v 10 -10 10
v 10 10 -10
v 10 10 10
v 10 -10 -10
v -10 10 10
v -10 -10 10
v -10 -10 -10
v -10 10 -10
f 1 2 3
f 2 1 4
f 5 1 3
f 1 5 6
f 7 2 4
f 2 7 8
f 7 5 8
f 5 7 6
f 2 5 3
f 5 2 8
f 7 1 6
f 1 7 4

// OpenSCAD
// -------------------------------------+---------------------------------------+---------------------------------------+---------------------------------------
// Title:        Parametric Test Block
// Version:      1.0
// Release Date: 2017-04-02 (ISO)
// Author:       Rohin Gosling
// -------------------------------------+---------------------------------------+---------------------------------------+---------------------------------------
//
// Description:
//
// - Simple 3D object generator, to generate test and calibration parts for 3D printers.
//
// Release Notes:
//
// - Version 1.0
//   * Model created.
//
// -------------------------------------+---------------------------------------+---------------------------------------+---------------------------------------

// -------------------------------------+---------------------------------------+---------------------------------------+---------------------------------------
// Constants:
// -------------------------------------+---------------------------------------+---------------------------------------+---------------------------------------

// System constants.

C_CONSTANT = 0 + 0;     // Used to hide constant values from Thingiverse. Add to other constants to hide them as well.

// General constants.

C_NONE = C_CONSTANT + 0;

// SCG constants.

SCG_OVERLAP = C_CONSTANT + 0.01;    // Used for overlapping Boolean operations in order to avoid Boolean edge artefacts.

// Shape

C_SHAPE_NONE      = C_CONSTANT + 0;
C_SHAPE_CUBOID    = C_CONSTANT + 1;
C_SHAPE_CYLINDER  = C_CONSTANT + 2;
C_SHAPE_PYRAMID   = C_CONSTANT + 3;
C_SHAPE_PRISM     = C_CONSTANT + 4;
C_SHAPE_ELLIPSOID = C_CONSTANT + 5;
C_SHAPE_TORUS     = C_CONSTANT + 6;

// Minimum and maximum constraints.

C_RESOLUTION_MIN  = C_CONSTANT + 8;
C_RESOLUTION_MAX  = C_CONSTANT + 64;
C_SIZE_MIN        = C_CONSTANT + 1.0;
C_SIDE_COUNT_MIN  = C_CONSTANT + 3;
C_SIDE_COUNT_MAX  = C_CONSTANT + 12;


// -------------------------------------+---------------------------------------+---------------------------------------+---------------------------------------
// Thingiverse Parameters.
//
// - These parameters are used to integrate with the Thingiverse Customizer, and should only be used by the
//   class member variables specified in the "Model parameters" section below.
//
// - These Thingiverse Parameters should never be accessed from inside any module. We do this to enforce 
//   principles of object orientation.
//
// - By separating concerns between variables exposed to Thingiverse vs. variables used internally by the 
//   SCAD model (class), we are better able to manage the ordering and grouping of variables exposed to 
//   Thingiverse, vs. the ordering and constraints of variables used internally by the model.
//
// -------------------------------------+---------------------------------------+---------------------------------------+---------------------------------------

/* [Assembbly Parameters] */

object_shape    = 1;        // [ 1:Cuboid, 2:Cylinder, 3:Pyramid, 4:Prism, 5:Ellipsoid, 6:Torus ]
x_bore_shape    = 0;        // [ 0: None, 2:Cylinder, 4:Prism ]
y_bore_shape    = 0;        // [ 0: None, 2:Cylinder, 4:Prism ]
z_bore_shape    = 0;        // [ 0: None, 2:Cylinder, 4:Prism ]
resolution      = 128;

/* [Cuboid Parameters] */

cuboid_x      = 20.0;
cuboid_y      = 20.0;
cuboid_z      = 20.0;
cuboid_fillet = 0.0;

/* [Cylinder Parameters] */

cylinder_diameter_base = 20.0;
cylinder_diameter_top  = 20.0;
cylinder_height        = 20.0;

/* [Pyramid Parameters] */

pyramid_side_count  = 4;
pyramid_side_length = 20.0;
pyramid_height      = 20.0;

/* [Prism Parameters] */

prism_side_count  = 3;
prism_side_length = 20.0;
prism_height      = 20.0;

/* [Ellipsoid Parameters] */

ellipsoid_diameter_x = 20.0;
ellipsoid_diameter_y = 20.0;
ellipsoid_diameter_z = 20.0;

/* [Torus Parameters] */

torus_major_radius = 12.0;
torus_minor_radius = 6.0;

/* [Bore Parameters] */

x_bore_diameter         = 10;
y_bore_diameter         = 10;
z_bore_diameter         = 10;
x_bore_prism_side_count = 4;
y_bore_prism_side_count = 4;
z_bore_prism_side_count = 4;

// -------------------------------------+---------------------------------------+---------------------------------------+---------------------------------------
// Model parameters and geometric constraints. (Class member variables).
//
// - If we treat an OpenSCAD file as though it is an object oriented class, then we can prefix global variables
//   with "m_", to denote class membership. 
//   - As an alternative to "m_", we could also use "this_" as a standard. However, "m_" is shorter and faster to type.
//   - Another advantage of this convention, is that we can arrange parameters meant for display in Thingiverse, in 
//     an order that makes sense to the user, while arranging the member versions of the parameters in an order
//     that better accommodates constraint computation.
//
// - Once we have defined global variables as member variables of a class, in this case the class represented
//   by the SCAD file, then we are free to better manage global vs local scope of class member 
//   variables, vs. local module (method) variables.
//
// - Thingiverse only integrates constant literal values. So as long as we reference other parameters or 
//   initialize variables as expressions, then none of these will appear in the Thingiverse customizer.
//
// -------------------------------------+---------------------------------------+---------------------------------------+---------------------------------------

// Assembly Parameters

m_object_shape    = object_shape;
m_x_bore_shape    = x_bore_shape;
m_y_bore_shape    = y_bore_shape;
m_z_bore_shape    = z_bore_shape;
m_resolution      = clip ( resolution, C_RESOLUTION_MIN, C_RESOLUTION_MAX );

// Cuboid Parameters.

m_cuboid_x             = ( cuboid_x < C_SIZE_MIN ) ? C_SIZE_MIN : cuboid_x;
m_cuboid_y             = ( cuboid_y < C_SIZE_MIN ) ? C_SIZE_MIN : cuboid_y;
m_cuboid_z             = ( cuboid_z < C_SIZE_MIN ) ? C_SIZE_MIN : cuboid_z;
m_cuboid_min_dimention = ( m_cuboid_x < m_cuboid_y && m_cuboid_x < m_cuboid_z ) ? m_cuboid_x : ( m_cuboid_y < m_cuboid_x && m_cuboid_y < m_cuboid_z ) ? m_cuboid_y : m_cuboid_z;
m_cuboid_fillet        = clip ( cuboid_fillet, 0.0, m_cuboid_min_dimention/2.0 );

// Cylinder Parameters.

m_cylinder_diameter_base = ( cylinder_diameter_base < 0.0 ) ? 0.0 : cylinder_diameter_base;
m_cylinder_diameter_top  = ( cylinder_diameter_top  < 0.0 ) ? 0.0 : cylinder_diameter_top;
m_cylinder_height        = ( cylinder_height < C_SIZE_MIN ) ? C_SIZE_MIN : cylinder_height;

// Pyramid Parameters.

m_pyramid_side_count  = clip ( pyramid_side_count, C_SIDE_COUNT_MIN, C_SIDE_COUNT_MAX );
m_pyramid_side_length = ( pyramid_side_length < C_SIZE_MIN ) ? C_SIZE_MIN : pyramid_side_length;
m_pyramid_height      = ( pyramid_height < C_SIZE_MIN ) ? C_SIZE_MIN : pyramid_height;

// Prism Parameters.

m_prism_side_count  = clip ( prism_side_count, C_SIDE_COUNT_MIN, C_SIDE_COUNT_MAX );
m_prism_side_length = ( prism_side_length < C_SIZE_MIN ) ? C_SIZE_MIN : prism_side_length;
m_prism_height      = ( prism_height < C_SIZE_MIN ) ? C_SIZE_MIN : prism_height;

// Ellipsoid Parameters.

m_ellipsoid_diameter_x = ( ellipsoid_diameter_x < C_SIZE_MIN ) ? C_SIZE_MIN : ellipsoid_diameter_x;
m_ellipsoid_diameter_y = ( ellipsoid_diameter_y < C_SIZE_MIN ) ? C_SIZE_MIN : ellipsoid_diameter_y;
m_ellipsoid_diameter_z = ( ellipsoid_diameter_z < C_SIZE_MIN ) ? C_SIZE_MIN : ellipsoid_diameter_z;

// Torus Parameters.

m_torus_major_radius = ( torus_major_radius < C_SIZE_MIN ) ? C_SIZE_MIN : torus_major_radius;
m_torus_minor_radius = ( torus_minor_radius < C_SIZE_MIN ) ? C_SIZE_MIN : torus_minor_radius;

// Bore.

m_x_bore_diameter         = ( x_bore_diameter < C_SIZE_MIN ) ? C_SIZE_MIN : x_bore_diameter;
m_y_bore_diameter         = ( y_bore_diameter < C_SIZE_MIN ) ? C_SIZE_MIN : y_bore_diameter;
m_z_bore_diameter         = ( z_bore_diameter < C_SIZE_MIN ) ? C_SIZE_MIN : z_bore_diameter;
m_x_bore_prism_side_count = clip ( x_bore_prism_side_count, C_SIDE_COUNT_MIN, C_SIDE_COUNT_MAX );
m_y_bore_prism_side_count = clip ( y_bore_prism_side_count, C_SIDE_COUNT_MIN, C_SIDE_COUNT_MAX );
m_z_bore_prism_side_count = clip ( z_bore_prism_side_count, C_SIDE_COUNT_MIN, C_SIDE_COUNT_MAX );

// -------------------------------------+---------------------------------------+---------------------------------------+---------------------------------------
// DEBUG: Console Output. 
// -------------------------------------+---------------------------------------+---------------------------------------+---------------------------------------

C_DEBUG_ENABLED = false;

if ( C_DEBUG_ENABLED )
{
    //echo ( m_x = m_x ); 
}

// -------------------------------------+---------------------------------------+---------------------------------------+---------------------------------------
// Module:      Main
// Module Type: Model
//
// Description:
//
// - Program entry point.
//
// -------------------------------------+---------------------------------------+---------------------------------------+---------------------------------------

main();

module main ()
{   
    // Initialize model resolution.
    
    $fn = m_resolution;
    
    // Generate hinge assembly.
        
    assembly ();    
}

// -------------------------------------+---------------------------------------+---------------------------------------+---------------------------------------
// Module:      assembly_main
// Module Type: Assembly
//
// Description:
//
// - Main component assembly.
//
// Parameters:
//
// - N/A
//
// -------------------------------------+---------------------------------------+---------------------------------------+---------------------------------------

module assembly ()
{
    if      ( m_object_shape == C_SHAPE_NONE )      object_none ();
    else if ( m_object_shape == C_SHAPE_CUBOID )    object_cuboid ();
    else if ( m_object_shape == C_SHAPE_CYLINDER )  object_cylinder ();
    else if ( m_object_shape == C_SHAPE_PYRAMID )   object_pyramid ();
    else if ( m_object_shape == C_SHAPE_PRISM )     object_prism ();
    else if ( m_object_shape == C_SHAPE_ELLIPSOID ) object_ellipsoid ();
    else if ( m_object_shape == C_SHAPE_TORUS )     object_torus ();    
    else if ( m_object_shape == C_SHAPE_NONE )      object_none ();    
}

// -------------------------------------+---------------------------------------+---------------------------------------+---------------------------------------
// Module:      object_none
// Module Type: Object
//
// Description:
//
// - Placeholder module for dealing with zero object selection.
//
// Parameters:
//
// - N/A
//
// -------------------------------------+---------------------------------------+---------------------------------------+---------------------------------------

module object_none ()
{
}

// -------------------------------------+---------------------------------------+---------------------------------------+---------------------------------------
// Module:      object_cuboid
// Module Type: Object
//
// Description:
//
// - Cuboid object defined by width, length, height and fillet size.
//
// Parameters:
//
// - N/A
//
// -------------------------------------+---------------------------------------+---------------------------------------+---------------------------------------

module object_cuboid ()
{
    // Initialize parameters.
    
    sf = m_cuboid_fillet;
    sx = m_cuboid_x;
    sy = m_cuboid_y;
    sz = m_cuboid_z;
    
    // Generate object.

    difference ()
    {
        // Generate base object.
        
        if ( sf > 0 )
        {
            object_cuboid_filleted ();
        }
        else
        {
            cube ( size = [ sx, sy, sz ], center = true );
        }
        
        // Subtract bores.
        
        cutting_tool_bore ( sx, sy, sz );
    }
}

// -------------------------------------+---------------------------------------+---------------------------------------+---------------------------------------
// Module:      object_cuboid_filleted
// Module Type: Object
//
// Description:
//
// - Used by the Cuboid object, to implement fillets.
//
// Parameters:
//
// - N/A
//
// -------------------------------------+---------------------------------------+---------------------------------------+---------------------------------------

module object_cuboid_filleted ()
{
    // Local constants.
    
    EDGE_CENTER = 0;    
    EDGE_ANGLE  = 1;
    EDGE_LENGTH = 2;
    
    // Initialize parameters.
    
    sf = m_cuboid_fillet;
    sx = m_cuboid_x;
    sy = m_cuboid_y;
    sz = m_cuboid_z;
    
    // Generate object.

    difference ()
    {
        // Generate base object.
        
        union ()
        {
            // Create cube work pieces.
            
            c = 2.0*sf;
            cube ( size = [ sx,     sy - c, sz - c ], center = true );
            cube ( size = [ sx - c, sy - c, sz     ], center = true );
            cube ( size = [ sx - c, sy,     sz - c ], center = true );
            
            // Create fillets.
            
            rx = sx/2.0 - sf;
            ry = sy/2.0 - sf;
            rz = sz/2.0 - sf;
            
            ex = m_cuboid_x - 2.0*sf;
            ey = m_cuboid_y - 2.0*sf;;
            ez = m_cuboid_z - 2.0*sf;;
            
            // Create vertex fillets.
            
            n_vertex = 8;
            v_vertex =
            [
                [ rx, ry,  rz ],[ -rx, ry,  rz ], [ -rx, -ry,  rz ], [ rx, -ry,  rz ],
                [ rx, ry, -rz ],[ -rx, ry, -rz ], [ -rx, -ry, -rz ], [ rx, -ry, -rz ]
            ];
                              
            for ( i = [ 0 : n_vertex - 1 ] )
            {
                translate ( v_vertex [ i ] ) sphere ( r = sf, center = true );
            }
            
            // Create edge fillets.
            
            n_edge = 12;
            v_edge =
            [
                [ [  rx,  ry, 0.0 ], [  0.0,  0.0, 0.0 ], ez ], [ [ -rx,  ry, 0.0 ], [  0.0,  0.0, 0.0 ], ez ],
                [ [  rx, -ry, 0.0 ], [  0.0,  0.0, 0.0 ], ez ], [ [ -rx, -ry, 0.0 ], [  0.0,  0.0, 0.0 ], ez ],
                [ [  rx, 0.0,  rz ], [ 90.0,  0.0, 0.0 ], ey ], [ [  rx, 0.0, -rz ], [ 90.0,  0.0, 0.0 ], ey ],
                [ [ -rx, 0.0,  rz ], [ 90.0,  0.0, 0.0 ], ey ], [ [ -rx, 0.0, -rz ], [ 90.0,  0.0, 0.0 ], ey ],
                [ [ 0.0,  ry,  rz ], [  0.0, 90.0, 0.0 ], ex ], [ [ 0.0,  ry, -rz ], [  0.0, 90.0, 0.0 ], ex ],
                [ [ 0.0, -ry,  rz ], [  0.0, 90.0, 0.0 ], ex ], [ [ 0.0, -ry, -rz ], [  0.0, 90.0, 0.0 ], ex ]
            ];
            
            for ( i = [ 0 : n_edge - 1 ] )
            {
                v = v_edge [ i ][ EDGE_CENTER ];
                a = v_edge [ i ][ EDGE_ANGLE  ];
                s = v_edge [ i ][ EDGE_LENGTH ];
                
                echo ( a = a );
                
                translate ( v ) rotate ( a ) cylinder ( r = sf, h = s, center = true );
            }
            
        }
        
        // Subtract bores.
        
        cutting_tool_bore ( sx, sy, sz );
    }
}

// -------------------------------------+---------------------------------------+---------------------------------------+---------------------------------------
// Module:      object_cylinder
// Module Type: Object
//
// Description:
//
// - Cylinder object defined by base diameter, top diameter and height.
//
// Parameters:
//
// - N/A
//
// -------------------------------------+---------------------------------------+---------------------------------------+---------------------------------------

module object_cylinder ()
{
    // Initialize parameters.
    
    d1 = m_cylinder_diameter_base;
    d2 = m_cylinder_diameter_top;
    h  = m_cylinder_height;
    
    // Generate object.
    
    difference ()
    {
        // Generate base object.
        
        cylinder ( d1 = d1, d2 = d2, h = h, center = true );
        
        // Subtract bores.
        
        d_max = ( d1 > d2 ) ? d1 : d2;
        cutting_tool_bore ( sx = d_max, sy = d_max, sz = h );
    }
}

// -------------------------------------+---------------------------------------+---------------------------------------+---------------------------------------
// Module:      object_pyramid
// Module Type: Object
//
// Description:
//
// - Pyramid object defined by height, side length, and side count.
//
// Parameters:
//
// - N/A
//
// -------------------------------------+---------------------------------------+---------------------------------------+---------------------------------------

module object_pyramid ()
{
    // Initialize parameters.
    
    n = m_pyramid_side_count;    
    s = m_pyramid_side_length;
    h = m_pyramid_height;
    t = 180/n;
    
    // Compute base diameter based on side length.
        
    d1 = s/sin(180/n);
    d2 = 0;
    
    // Generate object.
    
    difference ()
    {
        // Generate base object.
        
        rotate ( [ 0, 0, t ] ) cylinder ( d1 = d1, d2 = d2, h = h, $fn = n, center = true );
        
        // Subtract bores.
        
        d_max = ( d1 > d2 ) ? d1 : d2;
        translate ( [ 0, 0, -h/5 ] ) cutting_tool_bore ( sx = d_max, sy = d_max, sz = 2*h );
    }
}

// -------------------------------------+---------------------------------------+---------------------------------------+---------------------------------------
// Module:      object_prism
// Module Type: Object
//
// Description:
//
// - Prism object defined by height, side length, and side count.
//
// Parameters:
//
// - N/A
//
// -------------------------------------+---------------------------------------+---------------------------------------+---------------------------------------

module object_prism ()
{
    // Initialize parameters.
    
    n = m_prism_side_count;    
    s = m_prism_side_length;
    h = m_prism_height;
    t = 180/n;
    
    // Compute base diameter based on side length.
        
    d1 = s/sin(180/n);
    d2 = d1;
    
    // Generate object.
    
    difference ()
    {
        // Generate base object.
        
        rotate ( [ 0, 0, t ] ) cylinder ( d1 = d1, d2 = d2, h = h, $fn = n, center = true );
        
        // Subtract bores.
                
        cutting_tool_bore ( sx = d1, sy = d1, sz = h );
    }
}

// -------------------------------------+---------------------------------------+---------------------------------------+---------------------------------------
// Module:      object_ellipsoid
// Module Type: Object
//
// Description:
//
// - Ellipsoid object defined by width, length and height.
//
// Parameters:
//
// - N/A
//
// -------------------------------------+---------------------------------------+---------------------------------------+---------------------------------------

module object_ellipsoid ()
{
    // Compute ellipsoid scaling.
     
    d  = 1.0;     
    sx = m_ellipsoid_diameter_x;
    sy = m_ellipsoid_diameter_y;
    sz = m_ellipsoid_diameter_z;
    
    // Generate object.
    
    difference ()
    {
        // Generate base object.
        
        scale ( [ sx, sy, sz ] ) sphere ( d = d );
        
        // Subtract bores.
                
        cutting_tool_bore ( sx = sx, sy = sy, sz = sz );
    } 
}

// -------------------------------------+---------------------------------------+---------------------------------------+---------------------------------------
// Module:      object_torus
// Module Type: Object
//
// Description:
//
// - Torus object defined by major and minor radii.
//
// Parameters:
//
// - N/A
//
// -------------------------------------+---------------------------------------+---------------------------------------+---------------------------------------

module object_torus ()
{
    // Initialize parameters.
    
    R = m_torus_major_radius;
    r = m_torus_minor_radius;    
    
    // Generate object.
    
    difference ()
    {
        // Generate base object.
        
        rotate_extrude ()
        {
            translate ( [ R, 0, 0 ] ) circle ( r = r);
        }
        
        // Subtract bores.
        
        s  = 2*( r + R );
        sx = s;
        sy = s;
        sz = 2*r;
        
        cutting_tool_bore ( sx = sx, sy = sy, sz = sz );
    } 
}

// -------------------------------------+---------------------------------------+---------------------------------------+---------------------------------------
// Module:      cutting_tool_bore
// Module Type: Cutting tool
//
// Description:
//
// - Cutting tool used to cut the bore holes into the base object.
//
// Parameters:
//
// - N/A
//
// -------------------------------------+---------------------------------------+---------------------------------------+---------------------------------------

module cutting_tool_bore ( sx, sy, sz )
{
    nx = m_x_bore_prism_side_count;
    ny = m_y_bore_prism_side_count;
    nz = m_z_bore_prism_side_count;
    
    txo = ( nx == 6 ) ? 90.0 :   0.0;
    tyo = ( ny == 6 ) ? 0.0  : -90.0;
    
    tx = 180/nx + txo;
    ty = 180/ny + tyo;
    tz = 180/nz;
            
    // Subtract cylindrical bores.
        
    if ( m_x_bore_shape == C_SHAPE_CYLINDER ) rotate ( [ 0, 90, 0 ] ) cylinder ( d = m_x_bore_diameter, h = sx + SCG_OVERLAP, center = true );
    if ( m_y_bore_shape == C_SHAPE_CYLINDER ) rotate ( [ 90, 0, 0 ] ) cylinder ( d = m_y_bore_diameter, h = sy + SCG_OVERLAP, center = true );
    if ( m_z_bore_shape == C_SHAPE_CYLINDER ) rotate ( [ 0,  0, 0 ] ) cylinder ( d = m_z_bore_diameter, h = sz + SCG_OVERLAP, center = true );
            
    // Subtract prisim bores.
    
    if ( m_x_bore_shape == C_SHAPE_PRISM ) rotate ( [ 0, 90, 0 ] ) rotate ( [ 0, 0, tx ] ) cylinder ( d = m_x_bore_diameter, h = sx + SCG_OVERLAP, $fn = nx, center = true );
    if ( m_y_bore_shape == C_SHAPE_PRISM ) rotate ( [ 90, 0, 0 ] ) rotate ( [ 0, 0, ty ] ) cylinder ( d = m_y_bore_diameter, h = sy + SCG_OVERLAP, $fn = ny, center = true );
    if ( m_z_bore_shape == C_SHAPE_PRISM ) rotate ( [ 0,  0, 0 ] ) rotate ( [ 0, 0, tz ] ) cylinder ( d = m_z_bore_diameter, h = sz + SCG_OVERLAP, $fn = nz, center = true );
}


// -------------------------------------+---------------------------------------+---------------------------------------+---------------------------------------
// Module:      Rectangle.
// Module Type: 2D Shape.
//
// Description:
//
// - Creates a 2D rectangle.
//
// Parameters:
//
// - w
//   Rectangle width.
//
// - h
//   Rectangle height.
//
// - center
//   Center the rectangle about the origin (0,0,0) if true, else place the rectangle in the positive quadrant.
//
// -------------------------------------+---------------------------------------+---------------------------------------+---------------------------------------

module fillet_rectangle ( w, h, r, center )
{
    xs = w - 2*r;
    ys = h - 2*r;
    xd = w/2.0 - r;  
    yd = h/2.0 - r;    
    
    union ()
    {
        scale ( [ xs, h  ] ) square ( size = 1.0, center = center );
        scale ( [ w,  ys ] ) square ( size = 1.0, center = center );
        translate ( [  xd,  yd ] ) circle ( r = r, center = center );
        translate ( [  xd, -yd ] ) circle ( r = r, center = center );
        translate ( [ -xd, -yd ] ) circle ( r = r, center = center );
        translate ( [ -xd,  yd ] ) circle ( r = r, center = center );
    }
}

// -------------------------------------+---------------------------------------+---------------------------------------+---------------------------------------
// Module:      Rectangle.
// Module Type: 2D Shape.
//
// Description:
//
// - Creates a 2D rectangle.
//
// Parameters:
//
// - w
//   Rectangle width.
//
// - h
//   Rectangle height.
//
// - center
//   Center the rectangle about the origin (0,0,0) if true, else place the rectangle in the positive quadrant.
//
// -------------------------------------+---------------------------------------+---------------------------------------+---------------------------------------

module rectangle ( w, h, center )
{
    scale ( [ w, h ] ) square ( size = 1.0, center = center );
}

// -------------------------------------+---------------------------------------+---------------------------------------+---------------------------------------
// Function: Clip
//
// Description:
//
// - Clips an input value, to a minimum and maximum value.
//
//   x_min ≤ x ≤ x_max
// 
// Parameters:
//
// - x
//   Input value.
//
// - x_min
//   Minimal value constraint. Any x less than x_min, is set to x_min. 
//
// - x_max
//   Maximum value constraint. Any x greater than x_max, is set to x_max.
//
// -------------------------------------+---------------------------------------+---------------------------------------+---------------------------------------

function clip ( x, x_min, x_max ) = ( x < x_min ) ? x_min : ( x > x_max ) ? x_max : x;


// -------------------------------------+---------------------------------------+---------------------------------------+---------------------------------------
// Function: funtion_name
//
// Description:
//
// - Function description.
//
// Return Value:
//
// - Description of return value.
//
// Parameters:
//
// - x
//   Argument x description.
//
// - y
//   Argument y description.
//
// -------------------------------------+---------------------------------------+---------------------------------------+---------------------------------------

// -------------------------------------+---------------------------------------+---------------------------------------+---------------------------------------
// Module:      module_name
// Module Type: [ 2D Shape, Profile, Tool, Workpiece, Component ] 
// Description:
//
// - Module description.
//
// Parameters:
//
// - x
//   Argument x description.
//
// - y
//   Argument y description.
//
// -------------------------------------+---------------------------------------+---------------------------------------+---------------------------------------
